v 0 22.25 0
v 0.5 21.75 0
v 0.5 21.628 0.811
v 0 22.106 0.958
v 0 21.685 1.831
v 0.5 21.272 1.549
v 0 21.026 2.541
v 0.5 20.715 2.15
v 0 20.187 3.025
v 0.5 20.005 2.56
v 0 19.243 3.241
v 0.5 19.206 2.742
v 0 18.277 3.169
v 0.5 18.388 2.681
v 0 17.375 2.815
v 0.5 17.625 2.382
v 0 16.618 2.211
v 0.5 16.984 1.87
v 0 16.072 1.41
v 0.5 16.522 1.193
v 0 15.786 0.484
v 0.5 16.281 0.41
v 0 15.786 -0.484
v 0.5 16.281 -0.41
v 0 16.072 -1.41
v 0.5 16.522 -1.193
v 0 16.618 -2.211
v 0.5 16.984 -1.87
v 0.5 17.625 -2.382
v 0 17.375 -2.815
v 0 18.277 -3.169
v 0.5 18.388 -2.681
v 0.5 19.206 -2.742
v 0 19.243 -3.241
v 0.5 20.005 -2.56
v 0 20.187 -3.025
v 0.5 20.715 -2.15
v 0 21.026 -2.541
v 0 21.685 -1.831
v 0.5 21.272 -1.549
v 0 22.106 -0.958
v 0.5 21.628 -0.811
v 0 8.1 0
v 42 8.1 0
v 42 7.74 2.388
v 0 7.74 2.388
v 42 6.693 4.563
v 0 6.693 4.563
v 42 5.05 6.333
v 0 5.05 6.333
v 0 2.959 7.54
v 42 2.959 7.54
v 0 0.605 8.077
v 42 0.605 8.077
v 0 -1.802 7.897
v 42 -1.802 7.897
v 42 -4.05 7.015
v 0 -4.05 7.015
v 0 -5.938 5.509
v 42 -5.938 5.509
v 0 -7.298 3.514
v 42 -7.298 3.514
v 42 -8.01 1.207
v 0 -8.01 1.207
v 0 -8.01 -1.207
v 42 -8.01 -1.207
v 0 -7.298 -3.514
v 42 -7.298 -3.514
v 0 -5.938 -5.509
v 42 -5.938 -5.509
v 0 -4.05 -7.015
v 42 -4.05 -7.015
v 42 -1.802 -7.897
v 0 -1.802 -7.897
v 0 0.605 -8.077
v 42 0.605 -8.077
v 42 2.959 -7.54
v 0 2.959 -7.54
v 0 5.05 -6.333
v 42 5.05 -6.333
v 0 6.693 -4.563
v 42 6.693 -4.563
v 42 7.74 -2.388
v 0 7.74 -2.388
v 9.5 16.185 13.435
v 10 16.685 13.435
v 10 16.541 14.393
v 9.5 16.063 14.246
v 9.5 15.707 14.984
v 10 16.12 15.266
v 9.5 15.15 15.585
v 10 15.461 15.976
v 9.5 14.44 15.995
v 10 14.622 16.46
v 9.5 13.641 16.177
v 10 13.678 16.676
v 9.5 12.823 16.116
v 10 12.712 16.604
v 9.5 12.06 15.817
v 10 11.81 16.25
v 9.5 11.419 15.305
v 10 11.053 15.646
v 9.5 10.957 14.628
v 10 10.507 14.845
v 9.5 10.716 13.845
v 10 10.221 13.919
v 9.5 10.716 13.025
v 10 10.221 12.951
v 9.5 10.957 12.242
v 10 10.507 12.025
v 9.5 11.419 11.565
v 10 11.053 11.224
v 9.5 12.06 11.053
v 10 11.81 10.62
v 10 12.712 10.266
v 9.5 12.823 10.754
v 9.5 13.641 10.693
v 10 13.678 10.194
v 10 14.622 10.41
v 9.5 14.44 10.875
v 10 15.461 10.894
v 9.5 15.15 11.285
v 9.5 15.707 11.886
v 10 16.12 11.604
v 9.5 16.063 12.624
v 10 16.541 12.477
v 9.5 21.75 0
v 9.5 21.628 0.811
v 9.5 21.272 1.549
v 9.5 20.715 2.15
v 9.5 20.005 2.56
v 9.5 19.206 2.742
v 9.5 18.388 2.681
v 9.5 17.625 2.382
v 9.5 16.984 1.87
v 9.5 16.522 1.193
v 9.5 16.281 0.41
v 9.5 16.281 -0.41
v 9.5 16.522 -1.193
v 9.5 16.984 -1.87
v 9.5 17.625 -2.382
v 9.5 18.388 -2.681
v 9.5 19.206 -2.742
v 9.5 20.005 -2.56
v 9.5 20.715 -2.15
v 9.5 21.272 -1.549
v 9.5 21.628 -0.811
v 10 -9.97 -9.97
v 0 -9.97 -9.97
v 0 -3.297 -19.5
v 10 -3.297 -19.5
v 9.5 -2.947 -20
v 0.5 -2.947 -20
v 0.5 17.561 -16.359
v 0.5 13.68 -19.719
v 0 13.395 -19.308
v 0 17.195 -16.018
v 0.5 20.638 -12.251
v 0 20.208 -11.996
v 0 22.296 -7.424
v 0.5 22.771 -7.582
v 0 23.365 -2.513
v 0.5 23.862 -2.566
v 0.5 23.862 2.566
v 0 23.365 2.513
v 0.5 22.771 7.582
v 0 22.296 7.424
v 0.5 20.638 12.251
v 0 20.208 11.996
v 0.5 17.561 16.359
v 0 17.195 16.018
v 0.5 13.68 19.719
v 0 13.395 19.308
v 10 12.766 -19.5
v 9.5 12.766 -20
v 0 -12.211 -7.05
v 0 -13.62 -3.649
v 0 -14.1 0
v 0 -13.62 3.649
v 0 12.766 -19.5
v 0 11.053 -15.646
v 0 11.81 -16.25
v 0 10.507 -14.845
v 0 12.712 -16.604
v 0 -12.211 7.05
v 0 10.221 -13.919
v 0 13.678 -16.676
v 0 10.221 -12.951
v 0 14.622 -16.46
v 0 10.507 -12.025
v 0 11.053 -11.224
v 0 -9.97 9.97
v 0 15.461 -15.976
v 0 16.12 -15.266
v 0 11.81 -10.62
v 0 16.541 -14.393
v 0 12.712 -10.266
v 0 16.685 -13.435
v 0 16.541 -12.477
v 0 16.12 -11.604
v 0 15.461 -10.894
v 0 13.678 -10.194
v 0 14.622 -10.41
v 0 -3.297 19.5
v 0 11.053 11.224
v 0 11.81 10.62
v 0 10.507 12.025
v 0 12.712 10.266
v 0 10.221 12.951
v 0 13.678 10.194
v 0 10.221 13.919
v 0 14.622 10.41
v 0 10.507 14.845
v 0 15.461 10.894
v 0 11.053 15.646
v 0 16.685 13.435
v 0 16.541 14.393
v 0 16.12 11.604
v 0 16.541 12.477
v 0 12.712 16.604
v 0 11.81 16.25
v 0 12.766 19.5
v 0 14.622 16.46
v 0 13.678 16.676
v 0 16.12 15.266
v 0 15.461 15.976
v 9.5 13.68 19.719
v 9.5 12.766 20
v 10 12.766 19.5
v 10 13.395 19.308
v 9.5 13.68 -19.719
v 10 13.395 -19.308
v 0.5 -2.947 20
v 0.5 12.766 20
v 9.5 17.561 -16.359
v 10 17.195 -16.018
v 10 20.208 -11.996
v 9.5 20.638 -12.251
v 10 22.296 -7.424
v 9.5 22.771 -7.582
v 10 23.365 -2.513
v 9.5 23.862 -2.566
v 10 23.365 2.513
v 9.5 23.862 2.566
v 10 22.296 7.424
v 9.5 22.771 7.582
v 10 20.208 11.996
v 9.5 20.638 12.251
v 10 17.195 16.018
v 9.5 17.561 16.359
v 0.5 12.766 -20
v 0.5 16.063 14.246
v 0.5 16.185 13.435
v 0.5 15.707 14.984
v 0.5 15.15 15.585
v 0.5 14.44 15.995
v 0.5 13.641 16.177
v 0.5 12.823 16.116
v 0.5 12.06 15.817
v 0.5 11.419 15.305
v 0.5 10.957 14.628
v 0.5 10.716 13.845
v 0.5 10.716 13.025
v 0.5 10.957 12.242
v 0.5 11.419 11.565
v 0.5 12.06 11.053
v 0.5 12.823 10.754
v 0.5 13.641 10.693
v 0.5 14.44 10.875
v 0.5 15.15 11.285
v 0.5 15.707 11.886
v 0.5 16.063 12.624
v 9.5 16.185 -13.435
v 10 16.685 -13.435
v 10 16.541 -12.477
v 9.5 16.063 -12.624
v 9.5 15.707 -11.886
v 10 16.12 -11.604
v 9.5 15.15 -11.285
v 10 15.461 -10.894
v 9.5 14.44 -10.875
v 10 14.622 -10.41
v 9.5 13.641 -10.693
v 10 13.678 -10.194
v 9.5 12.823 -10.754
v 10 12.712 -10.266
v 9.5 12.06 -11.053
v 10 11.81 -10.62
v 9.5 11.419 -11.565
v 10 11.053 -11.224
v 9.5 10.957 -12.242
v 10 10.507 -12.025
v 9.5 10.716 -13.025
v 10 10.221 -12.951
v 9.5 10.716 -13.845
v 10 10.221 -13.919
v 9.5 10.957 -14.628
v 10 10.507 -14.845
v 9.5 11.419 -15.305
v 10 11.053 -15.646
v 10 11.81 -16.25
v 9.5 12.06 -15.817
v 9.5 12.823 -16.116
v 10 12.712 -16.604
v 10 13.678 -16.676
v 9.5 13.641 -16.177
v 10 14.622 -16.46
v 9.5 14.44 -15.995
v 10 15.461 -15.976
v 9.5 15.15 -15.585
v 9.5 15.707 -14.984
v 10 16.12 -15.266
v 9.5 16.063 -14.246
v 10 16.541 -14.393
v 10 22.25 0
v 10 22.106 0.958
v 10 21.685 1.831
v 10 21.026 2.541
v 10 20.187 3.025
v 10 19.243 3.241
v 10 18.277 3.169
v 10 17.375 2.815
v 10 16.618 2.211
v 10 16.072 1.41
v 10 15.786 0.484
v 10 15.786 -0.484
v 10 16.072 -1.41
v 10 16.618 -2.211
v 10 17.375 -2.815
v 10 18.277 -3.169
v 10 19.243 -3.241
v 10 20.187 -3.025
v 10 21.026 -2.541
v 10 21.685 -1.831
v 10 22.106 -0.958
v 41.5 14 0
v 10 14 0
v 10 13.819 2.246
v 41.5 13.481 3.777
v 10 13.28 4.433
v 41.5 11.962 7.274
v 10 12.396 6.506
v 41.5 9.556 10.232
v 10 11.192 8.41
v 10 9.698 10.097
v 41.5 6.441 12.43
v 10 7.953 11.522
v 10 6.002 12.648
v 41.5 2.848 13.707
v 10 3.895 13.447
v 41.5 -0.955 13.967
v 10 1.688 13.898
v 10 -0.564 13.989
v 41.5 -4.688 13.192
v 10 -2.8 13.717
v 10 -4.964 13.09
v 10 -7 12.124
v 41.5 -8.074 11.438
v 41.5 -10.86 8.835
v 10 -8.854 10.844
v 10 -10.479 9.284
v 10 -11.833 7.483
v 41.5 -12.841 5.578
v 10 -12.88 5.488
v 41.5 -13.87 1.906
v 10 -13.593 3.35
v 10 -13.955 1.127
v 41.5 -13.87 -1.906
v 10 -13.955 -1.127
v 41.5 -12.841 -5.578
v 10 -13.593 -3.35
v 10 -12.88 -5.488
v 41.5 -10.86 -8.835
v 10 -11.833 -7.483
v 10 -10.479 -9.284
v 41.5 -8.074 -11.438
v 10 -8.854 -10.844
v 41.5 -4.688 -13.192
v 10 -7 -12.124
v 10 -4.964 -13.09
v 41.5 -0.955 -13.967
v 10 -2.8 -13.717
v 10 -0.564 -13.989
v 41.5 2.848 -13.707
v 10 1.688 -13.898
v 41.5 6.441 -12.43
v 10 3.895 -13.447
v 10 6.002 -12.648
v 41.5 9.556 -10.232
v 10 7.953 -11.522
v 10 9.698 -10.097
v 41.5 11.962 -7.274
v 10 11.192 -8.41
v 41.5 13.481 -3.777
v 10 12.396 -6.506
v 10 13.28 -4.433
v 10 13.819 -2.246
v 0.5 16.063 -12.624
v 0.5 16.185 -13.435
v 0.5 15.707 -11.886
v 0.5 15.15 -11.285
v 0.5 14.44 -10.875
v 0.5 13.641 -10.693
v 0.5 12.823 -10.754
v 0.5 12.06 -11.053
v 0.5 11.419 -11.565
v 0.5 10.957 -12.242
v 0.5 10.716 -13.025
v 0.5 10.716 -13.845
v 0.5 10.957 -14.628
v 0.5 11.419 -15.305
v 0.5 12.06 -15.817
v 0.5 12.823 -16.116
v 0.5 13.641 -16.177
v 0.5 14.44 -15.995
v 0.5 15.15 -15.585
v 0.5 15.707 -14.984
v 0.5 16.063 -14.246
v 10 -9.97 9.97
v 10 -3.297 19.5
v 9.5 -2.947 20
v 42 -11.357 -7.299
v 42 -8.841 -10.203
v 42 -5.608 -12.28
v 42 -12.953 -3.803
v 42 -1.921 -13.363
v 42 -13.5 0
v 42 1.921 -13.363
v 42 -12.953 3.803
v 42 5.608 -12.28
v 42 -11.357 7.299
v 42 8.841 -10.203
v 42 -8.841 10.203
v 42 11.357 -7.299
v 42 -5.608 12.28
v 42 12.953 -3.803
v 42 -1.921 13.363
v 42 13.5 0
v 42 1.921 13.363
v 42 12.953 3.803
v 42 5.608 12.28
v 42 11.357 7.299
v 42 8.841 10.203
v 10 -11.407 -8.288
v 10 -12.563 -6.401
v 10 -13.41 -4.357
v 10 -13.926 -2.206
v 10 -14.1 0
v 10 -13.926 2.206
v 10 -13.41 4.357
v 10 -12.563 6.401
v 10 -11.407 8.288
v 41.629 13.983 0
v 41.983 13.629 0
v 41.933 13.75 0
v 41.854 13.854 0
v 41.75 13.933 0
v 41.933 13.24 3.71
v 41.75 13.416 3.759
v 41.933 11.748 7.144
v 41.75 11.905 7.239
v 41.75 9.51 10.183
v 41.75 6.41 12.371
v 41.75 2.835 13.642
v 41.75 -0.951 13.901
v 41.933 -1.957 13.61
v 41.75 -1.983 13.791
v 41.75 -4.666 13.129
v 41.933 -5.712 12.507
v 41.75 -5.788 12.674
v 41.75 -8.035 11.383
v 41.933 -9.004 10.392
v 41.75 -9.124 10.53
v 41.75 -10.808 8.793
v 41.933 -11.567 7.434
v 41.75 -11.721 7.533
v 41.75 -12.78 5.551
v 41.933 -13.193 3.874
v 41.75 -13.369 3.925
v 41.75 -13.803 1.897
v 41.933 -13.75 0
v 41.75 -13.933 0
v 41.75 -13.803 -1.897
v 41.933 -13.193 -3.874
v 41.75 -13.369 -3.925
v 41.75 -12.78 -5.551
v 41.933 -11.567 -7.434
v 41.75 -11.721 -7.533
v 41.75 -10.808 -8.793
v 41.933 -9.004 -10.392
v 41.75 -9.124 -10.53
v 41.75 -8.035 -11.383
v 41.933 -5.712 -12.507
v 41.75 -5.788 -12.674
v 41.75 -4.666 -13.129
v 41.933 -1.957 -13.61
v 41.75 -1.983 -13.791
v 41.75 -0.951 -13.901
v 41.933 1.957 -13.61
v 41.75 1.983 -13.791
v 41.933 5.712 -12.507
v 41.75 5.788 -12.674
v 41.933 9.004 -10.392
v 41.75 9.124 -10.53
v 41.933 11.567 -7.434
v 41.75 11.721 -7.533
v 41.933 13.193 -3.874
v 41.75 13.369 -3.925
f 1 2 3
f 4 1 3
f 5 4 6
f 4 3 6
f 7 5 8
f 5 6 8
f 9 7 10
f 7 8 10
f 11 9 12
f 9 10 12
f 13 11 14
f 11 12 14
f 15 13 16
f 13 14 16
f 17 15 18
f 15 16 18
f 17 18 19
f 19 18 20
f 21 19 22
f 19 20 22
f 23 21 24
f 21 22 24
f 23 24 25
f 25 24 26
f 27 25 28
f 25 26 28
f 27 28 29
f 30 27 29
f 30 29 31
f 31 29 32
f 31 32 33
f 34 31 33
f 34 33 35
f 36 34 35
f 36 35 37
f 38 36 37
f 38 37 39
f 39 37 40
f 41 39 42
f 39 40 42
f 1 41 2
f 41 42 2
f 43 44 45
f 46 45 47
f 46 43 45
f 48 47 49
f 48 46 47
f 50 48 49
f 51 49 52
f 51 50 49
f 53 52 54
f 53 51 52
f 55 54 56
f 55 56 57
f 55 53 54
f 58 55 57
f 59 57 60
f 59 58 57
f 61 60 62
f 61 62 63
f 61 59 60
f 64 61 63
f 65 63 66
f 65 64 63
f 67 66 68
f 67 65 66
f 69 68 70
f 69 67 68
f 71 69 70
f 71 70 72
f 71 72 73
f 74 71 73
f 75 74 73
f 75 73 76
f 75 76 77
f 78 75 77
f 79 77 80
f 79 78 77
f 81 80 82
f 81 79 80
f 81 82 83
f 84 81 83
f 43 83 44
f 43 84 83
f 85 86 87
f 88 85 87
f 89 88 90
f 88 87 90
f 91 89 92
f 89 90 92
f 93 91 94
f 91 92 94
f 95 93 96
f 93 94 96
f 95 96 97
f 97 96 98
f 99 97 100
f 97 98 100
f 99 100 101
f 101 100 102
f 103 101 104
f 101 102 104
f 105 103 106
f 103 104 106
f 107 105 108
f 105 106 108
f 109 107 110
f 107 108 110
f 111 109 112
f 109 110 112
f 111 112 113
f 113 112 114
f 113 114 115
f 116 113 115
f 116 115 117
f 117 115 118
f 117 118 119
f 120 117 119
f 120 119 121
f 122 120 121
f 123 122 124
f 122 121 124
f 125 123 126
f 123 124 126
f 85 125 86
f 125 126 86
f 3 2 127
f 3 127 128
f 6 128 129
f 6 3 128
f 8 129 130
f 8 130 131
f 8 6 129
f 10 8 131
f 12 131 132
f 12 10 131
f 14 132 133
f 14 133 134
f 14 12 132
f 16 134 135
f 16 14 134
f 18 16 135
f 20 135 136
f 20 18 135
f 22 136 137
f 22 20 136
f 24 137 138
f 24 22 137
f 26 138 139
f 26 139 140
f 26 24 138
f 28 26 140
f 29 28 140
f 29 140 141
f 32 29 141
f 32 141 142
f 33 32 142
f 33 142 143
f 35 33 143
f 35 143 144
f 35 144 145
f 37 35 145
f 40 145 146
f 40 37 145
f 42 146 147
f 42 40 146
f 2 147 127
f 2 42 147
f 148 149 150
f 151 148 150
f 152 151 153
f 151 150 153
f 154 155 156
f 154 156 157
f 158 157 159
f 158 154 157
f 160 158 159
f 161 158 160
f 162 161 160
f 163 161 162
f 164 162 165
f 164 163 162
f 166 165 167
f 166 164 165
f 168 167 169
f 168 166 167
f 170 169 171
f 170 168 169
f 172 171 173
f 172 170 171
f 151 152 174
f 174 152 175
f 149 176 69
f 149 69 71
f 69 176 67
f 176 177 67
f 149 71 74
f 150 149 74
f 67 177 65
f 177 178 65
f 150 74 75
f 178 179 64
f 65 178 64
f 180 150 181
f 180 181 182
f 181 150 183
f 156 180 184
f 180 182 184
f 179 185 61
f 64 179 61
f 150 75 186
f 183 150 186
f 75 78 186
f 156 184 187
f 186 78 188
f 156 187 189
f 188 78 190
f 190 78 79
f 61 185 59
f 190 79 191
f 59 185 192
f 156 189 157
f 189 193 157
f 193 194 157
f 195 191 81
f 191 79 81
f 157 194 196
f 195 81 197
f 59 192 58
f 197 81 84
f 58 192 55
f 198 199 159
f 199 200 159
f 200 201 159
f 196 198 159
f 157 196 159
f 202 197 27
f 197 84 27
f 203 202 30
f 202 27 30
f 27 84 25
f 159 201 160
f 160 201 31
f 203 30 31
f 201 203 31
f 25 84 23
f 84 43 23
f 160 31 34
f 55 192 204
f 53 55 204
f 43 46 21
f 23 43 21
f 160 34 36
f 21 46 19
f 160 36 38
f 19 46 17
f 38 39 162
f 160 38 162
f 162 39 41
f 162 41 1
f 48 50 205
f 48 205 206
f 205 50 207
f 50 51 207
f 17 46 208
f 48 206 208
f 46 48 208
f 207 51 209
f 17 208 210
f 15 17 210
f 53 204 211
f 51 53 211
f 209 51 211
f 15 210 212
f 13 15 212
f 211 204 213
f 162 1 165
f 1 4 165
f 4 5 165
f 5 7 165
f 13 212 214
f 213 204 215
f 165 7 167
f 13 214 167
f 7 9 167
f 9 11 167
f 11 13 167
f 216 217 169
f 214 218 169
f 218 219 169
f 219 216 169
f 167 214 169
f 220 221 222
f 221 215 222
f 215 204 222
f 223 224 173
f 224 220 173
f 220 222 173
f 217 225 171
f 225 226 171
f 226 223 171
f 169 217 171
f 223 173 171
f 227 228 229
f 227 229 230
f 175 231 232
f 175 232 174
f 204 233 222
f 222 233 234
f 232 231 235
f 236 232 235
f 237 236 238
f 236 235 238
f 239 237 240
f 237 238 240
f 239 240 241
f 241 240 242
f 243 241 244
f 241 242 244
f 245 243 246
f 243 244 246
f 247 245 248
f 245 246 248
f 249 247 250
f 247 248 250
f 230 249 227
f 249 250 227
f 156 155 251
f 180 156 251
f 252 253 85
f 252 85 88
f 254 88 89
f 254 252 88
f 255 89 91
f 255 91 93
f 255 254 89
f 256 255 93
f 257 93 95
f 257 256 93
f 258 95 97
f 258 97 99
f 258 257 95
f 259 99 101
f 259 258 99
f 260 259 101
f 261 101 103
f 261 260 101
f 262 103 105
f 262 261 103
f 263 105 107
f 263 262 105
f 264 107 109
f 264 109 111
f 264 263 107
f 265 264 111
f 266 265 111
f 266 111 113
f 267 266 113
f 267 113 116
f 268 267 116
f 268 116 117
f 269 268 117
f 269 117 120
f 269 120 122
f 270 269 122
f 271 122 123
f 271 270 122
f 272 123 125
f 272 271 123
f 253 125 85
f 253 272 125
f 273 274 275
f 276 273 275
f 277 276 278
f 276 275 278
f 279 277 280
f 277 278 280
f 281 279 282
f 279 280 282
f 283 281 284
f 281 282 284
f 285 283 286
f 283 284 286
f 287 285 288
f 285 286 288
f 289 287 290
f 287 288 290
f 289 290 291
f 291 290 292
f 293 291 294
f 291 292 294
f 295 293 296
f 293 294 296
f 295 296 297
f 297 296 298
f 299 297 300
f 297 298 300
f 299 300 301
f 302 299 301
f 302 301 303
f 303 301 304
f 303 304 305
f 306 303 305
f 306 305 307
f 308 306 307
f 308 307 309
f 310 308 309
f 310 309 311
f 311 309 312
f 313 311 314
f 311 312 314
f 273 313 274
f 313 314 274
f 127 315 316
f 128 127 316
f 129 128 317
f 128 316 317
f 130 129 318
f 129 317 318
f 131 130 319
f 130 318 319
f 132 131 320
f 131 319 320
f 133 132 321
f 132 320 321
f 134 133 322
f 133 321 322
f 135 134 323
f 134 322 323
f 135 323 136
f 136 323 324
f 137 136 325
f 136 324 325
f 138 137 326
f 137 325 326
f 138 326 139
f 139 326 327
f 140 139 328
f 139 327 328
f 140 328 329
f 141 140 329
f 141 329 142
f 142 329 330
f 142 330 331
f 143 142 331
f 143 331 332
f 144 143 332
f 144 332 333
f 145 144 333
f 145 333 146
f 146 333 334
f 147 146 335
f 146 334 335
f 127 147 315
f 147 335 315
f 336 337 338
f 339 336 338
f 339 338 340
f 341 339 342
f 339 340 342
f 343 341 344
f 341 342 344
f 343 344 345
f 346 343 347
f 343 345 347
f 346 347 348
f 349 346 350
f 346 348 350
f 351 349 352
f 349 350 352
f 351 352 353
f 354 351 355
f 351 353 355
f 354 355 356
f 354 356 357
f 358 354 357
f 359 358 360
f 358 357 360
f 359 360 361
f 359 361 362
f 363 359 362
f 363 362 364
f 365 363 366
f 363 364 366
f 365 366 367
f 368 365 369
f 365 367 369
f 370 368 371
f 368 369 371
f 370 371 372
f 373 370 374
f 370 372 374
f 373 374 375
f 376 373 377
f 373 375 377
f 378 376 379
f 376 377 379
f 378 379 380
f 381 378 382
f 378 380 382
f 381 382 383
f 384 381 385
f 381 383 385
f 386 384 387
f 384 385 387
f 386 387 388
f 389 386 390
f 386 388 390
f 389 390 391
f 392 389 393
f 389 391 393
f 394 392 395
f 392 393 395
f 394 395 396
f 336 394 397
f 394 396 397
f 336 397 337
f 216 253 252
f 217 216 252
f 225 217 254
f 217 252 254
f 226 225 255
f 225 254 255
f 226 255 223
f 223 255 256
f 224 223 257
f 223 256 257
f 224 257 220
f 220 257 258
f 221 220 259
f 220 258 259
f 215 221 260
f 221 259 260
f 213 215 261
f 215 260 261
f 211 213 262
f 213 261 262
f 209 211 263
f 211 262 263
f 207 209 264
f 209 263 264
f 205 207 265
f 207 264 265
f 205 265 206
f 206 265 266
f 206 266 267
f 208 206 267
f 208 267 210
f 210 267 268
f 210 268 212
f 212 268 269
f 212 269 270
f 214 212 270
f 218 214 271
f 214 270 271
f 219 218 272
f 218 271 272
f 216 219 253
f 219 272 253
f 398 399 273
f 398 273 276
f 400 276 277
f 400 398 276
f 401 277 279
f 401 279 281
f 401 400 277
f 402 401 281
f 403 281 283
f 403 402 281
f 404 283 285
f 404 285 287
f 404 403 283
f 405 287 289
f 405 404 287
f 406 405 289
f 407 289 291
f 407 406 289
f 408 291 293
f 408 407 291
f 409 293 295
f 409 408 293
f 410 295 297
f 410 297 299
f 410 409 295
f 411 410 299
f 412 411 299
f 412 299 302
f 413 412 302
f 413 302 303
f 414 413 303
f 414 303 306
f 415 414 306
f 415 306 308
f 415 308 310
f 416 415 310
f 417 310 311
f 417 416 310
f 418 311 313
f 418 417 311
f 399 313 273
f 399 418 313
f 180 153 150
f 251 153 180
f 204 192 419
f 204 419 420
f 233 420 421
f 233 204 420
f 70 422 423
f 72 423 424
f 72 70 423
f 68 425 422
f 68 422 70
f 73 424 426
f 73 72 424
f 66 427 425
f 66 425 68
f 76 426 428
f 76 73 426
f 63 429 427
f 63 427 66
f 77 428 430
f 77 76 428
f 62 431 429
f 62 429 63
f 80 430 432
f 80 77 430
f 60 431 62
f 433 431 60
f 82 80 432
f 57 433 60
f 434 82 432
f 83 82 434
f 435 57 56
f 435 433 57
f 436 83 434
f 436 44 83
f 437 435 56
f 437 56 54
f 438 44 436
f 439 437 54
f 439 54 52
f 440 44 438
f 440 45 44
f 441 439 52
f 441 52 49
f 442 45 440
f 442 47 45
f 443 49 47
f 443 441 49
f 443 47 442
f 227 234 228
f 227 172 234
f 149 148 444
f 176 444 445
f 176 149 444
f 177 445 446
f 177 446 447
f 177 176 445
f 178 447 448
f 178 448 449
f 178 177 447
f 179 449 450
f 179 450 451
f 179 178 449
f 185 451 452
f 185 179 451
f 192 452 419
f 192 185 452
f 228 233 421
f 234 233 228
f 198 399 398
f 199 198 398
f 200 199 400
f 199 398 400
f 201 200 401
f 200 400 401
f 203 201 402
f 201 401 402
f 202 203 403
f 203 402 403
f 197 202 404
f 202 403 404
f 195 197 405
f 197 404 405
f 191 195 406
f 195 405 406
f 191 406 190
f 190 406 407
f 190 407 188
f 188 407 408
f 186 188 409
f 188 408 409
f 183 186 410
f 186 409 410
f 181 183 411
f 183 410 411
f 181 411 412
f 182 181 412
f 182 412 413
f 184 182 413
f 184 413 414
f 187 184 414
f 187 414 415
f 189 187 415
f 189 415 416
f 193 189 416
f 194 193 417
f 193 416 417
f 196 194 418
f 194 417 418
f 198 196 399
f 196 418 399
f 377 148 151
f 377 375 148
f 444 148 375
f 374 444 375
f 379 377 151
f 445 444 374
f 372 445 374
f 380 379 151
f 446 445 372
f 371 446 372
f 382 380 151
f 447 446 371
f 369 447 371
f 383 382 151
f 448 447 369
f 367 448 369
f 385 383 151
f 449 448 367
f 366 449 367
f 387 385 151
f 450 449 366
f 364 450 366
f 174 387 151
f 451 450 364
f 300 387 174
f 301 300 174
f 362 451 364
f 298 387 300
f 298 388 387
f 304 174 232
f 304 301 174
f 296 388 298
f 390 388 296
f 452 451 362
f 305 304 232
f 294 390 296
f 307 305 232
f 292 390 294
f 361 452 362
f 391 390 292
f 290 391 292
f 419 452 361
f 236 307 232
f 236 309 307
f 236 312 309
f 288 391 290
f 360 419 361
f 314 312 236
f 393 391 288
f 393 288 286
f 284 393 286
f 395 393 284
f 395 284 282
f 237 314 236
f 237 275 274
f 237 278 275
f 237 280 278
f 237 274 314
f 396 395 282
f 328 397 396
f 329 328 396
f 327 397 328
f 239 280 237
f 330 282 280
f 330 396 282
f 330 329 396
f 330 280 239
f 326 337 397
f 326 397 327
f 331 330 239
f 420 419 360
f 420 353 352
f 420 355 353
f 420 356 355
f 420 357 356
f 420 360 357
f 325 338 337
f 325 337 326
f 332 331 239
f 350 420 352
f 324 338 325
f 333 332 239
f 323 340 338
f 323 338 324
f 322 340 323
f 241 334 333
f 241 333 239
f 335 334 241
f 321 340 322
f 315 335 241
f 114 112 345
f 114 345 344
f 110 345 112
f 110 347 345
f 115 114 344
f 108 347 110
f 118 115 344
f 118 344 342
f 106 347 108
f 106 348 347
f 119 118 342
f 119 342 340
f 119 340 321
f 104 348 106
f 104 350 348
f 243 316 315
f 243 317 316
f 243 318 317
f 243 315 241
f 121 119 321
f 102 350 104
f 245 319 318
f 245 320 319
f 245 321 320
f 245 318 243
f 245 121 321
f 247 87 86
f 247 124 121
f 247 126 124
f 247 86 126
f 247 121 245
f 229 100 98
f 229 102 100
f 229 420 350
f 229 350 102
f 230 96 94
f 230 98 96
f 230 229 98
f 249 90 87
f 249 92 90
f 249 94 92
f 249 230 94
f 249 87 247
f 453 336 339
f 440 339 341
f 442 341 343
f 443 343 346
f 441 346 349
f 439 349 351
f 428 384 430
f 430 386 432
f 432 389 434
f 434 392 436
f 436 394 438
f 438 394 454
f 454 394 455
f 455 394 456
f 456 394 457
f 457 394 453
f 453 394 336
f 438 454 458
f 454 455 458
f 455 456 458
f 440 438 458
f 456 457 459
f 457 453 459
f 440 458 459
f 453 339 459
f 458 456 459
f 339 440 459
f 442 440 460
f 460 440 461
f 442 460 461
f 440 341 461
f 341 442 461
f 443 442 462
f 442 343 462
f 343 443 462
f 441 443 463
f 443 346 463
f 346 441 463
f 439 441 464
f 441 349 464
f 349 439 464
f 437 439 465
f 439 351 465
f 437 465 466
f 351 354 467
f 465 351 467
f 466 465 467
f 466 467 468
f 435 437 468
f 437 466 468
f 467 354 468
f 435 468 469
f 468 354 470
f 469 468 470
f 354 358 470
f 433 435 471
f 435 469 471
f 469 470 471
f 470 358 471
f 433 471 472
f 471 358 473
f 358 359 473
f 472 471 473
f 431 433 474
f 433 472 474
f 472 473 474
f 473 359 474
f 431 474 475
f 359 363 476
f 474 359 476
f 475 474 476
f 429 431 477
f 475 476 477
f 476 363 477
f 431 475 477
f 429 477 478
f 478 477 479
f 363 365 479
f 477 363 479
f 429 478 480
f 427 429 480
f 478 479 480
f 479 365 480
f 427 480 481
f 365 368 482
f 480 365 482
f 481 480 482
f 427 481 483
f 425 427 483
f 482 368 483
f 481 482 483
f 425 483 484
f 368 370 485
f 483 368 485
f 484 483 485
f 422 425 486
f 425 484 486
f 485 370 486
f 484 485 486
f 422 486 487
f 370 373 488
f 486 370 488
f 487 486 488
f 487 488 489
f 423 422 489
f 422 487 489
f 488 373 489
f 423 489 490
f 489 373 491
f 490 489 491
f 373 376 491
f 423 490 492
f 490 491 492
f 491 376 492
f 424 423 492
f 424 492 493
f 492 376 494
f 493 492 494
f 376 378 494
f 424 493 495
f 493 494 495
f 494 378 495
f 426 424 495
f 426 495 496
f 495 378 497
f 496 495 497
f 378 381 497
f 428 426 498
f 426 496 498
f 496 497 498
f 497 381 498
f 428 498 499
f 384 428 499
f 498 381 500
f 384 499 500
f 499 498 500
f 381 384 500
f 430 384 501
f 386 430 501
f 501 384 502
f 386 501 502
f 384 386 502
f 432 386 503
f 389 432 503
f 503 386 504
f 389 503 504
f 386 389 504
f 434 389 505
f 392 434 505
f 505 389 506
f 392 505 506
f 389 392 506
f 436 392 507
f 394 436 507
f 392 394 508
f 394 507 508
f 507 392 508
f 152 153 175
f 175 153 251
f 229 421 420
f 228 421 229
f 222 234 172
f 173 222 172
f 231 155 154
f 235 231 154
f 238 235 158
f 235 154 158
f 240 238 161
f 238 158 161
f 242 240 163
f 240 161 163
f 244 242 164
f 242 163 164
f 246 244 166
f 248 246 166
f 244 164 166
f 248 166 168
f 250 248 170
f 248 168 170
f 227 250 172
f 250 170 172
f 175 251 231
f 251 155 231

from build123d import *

# Parameters (mm, degrees)
SKETCH_R        = 2.75
SKETCH_R_2      = 8.1
PAD_DEPTH       = 10
SKETCH001_R     = 14
SKETCH001_R_2   = 8.1
PAD001_DEPTH    = 32
CHAMFER_SIZE    = 0.5
FILLET_R        = 0.5
CHAMFER001_SIZE = 0.5
POCKET_DEPTH    = 10


with BuildPart() as part:
    # Sketch → Pad (new body)
    with BuildSketch(Plane.YZ):
        with BuildLine():
            ThreePointArc((-13.266499, 20), (-24, 0), (-13.266499, -20))
            Line((-13.266499, -20), (13.266499, -20))
            ThreePointArc((13.266499, -20), (24, 0), (13.266499, 20))
            Line((-13.266499, 20), (13.266499, 20))
        make_face()
        with Locations((-13.435058, 13.435)):
            Circle(SKETCH_R, mode=Mode.SUBTRACT)
        with Locations((-19, 0)):
            Circle(SKETCH_R, mode=Mode.SUBTRACT)
        with Locations((-13.435058, -13.435)):
            Circle(SKETCH_R, mode=Mode.SUBTRACT)
        with Locations((13.435058, 13.435)):
            Circle(SKETCH_R, mode=Mode.SUBTRACT)
        with Locations((19, 0)):
            Circle(SKETCH_R, mode=Mode.SUBTRACT)
        with Locations((13.435058, -13.435)):
            Circle(SKETCH_R, mode=Mode.SUBTRACT)
        Circle(SKETCH_R_2, mode=Mode.SUBTRACT)
    extrude(amount=PAD_DEPTH)

    # Sketch001 → Pad001 (new body)
    with BuildSketch(Plane.YZ.offset(10)):
        Circle(SKETCH001_R)
        Circle(SKETCH001_R_2, mode=Mode.SUBTRACT)
    extrude(amount=PAD001_DEPTH)

    # Chamfer
    chamfer_edges = [part.edges().sort_by_distance(p)[0] for p in [
        (0, -16.185058, -13.435),
        (10, -16.185058, -13.435),
        (0, -21.75, 0),
        (10, -21.75, 0),
        (0, -16.185058, 13.435),
        (10, -16.185058, 13.435),
        (0, 10.685058, 13.435),
        (10, 10.685058, 13.435),
        (0, 16.25, 0),
        (10, 16.25, 0),
        (0, 10.685058, -13.435),
        (10, 10.685058, -13.435),
    ]]
    chamfer(chamfer_edges, length=CHAMFER_SIZE)

    # Fillet
    fillet_edges = [part.edges().sort_by_distance(p)[0] for p in [
        (42, -14, 0),
    ]]
    fillet(fillet_edges, radius=FILLET_R)

    # Chamfer001
    chamfer001_edges = [part.edges().sort_by_distance(p)[0] for p in [
        (5, -13.266499, 20),
        (5, -13.266499, -20),
        (0, -24, 0),
        (10, -24, 0),
        (5, 13.266499, 20),
        (0, 0, 20),
        (10, 0, 20),
        (5, 13.266499, -20),
        (0, 24, 0),
        (10, 24, 0),
        (0, 0, -20),
        (10, 0, -20),
    ]]
    chamfer(chamfer001_edges, length=CHAMFER001_SIZE)

    # Sketch002 → Pocket (cut)
    with BuildSketch(Plane(origin=(0, 0, 0), x_dir=(0, 1, 0), z_dir=(-1, 0, 0))):
        with BuildLine():
            ThreePointArc((-9.970206, 9.970206), (-14.1, 0), (-9.970206, -9.970206))
            Line((-9.970206, -9.970206), (-2.737206, -20.3))
            Line((-2.737206, -20.3), (18, -20.3))
            Line((18, -20.3), (18, -27))
            Line((18, -27), (0, -27))
            ThreePointArc((0, 27), (-27, 0), (0, -27))
            Line((0, 27), (18, 27))
            Line((18, 27), (18, 20.3))
            Line((18, 20.3), (-2.737206, 20.3))
            Line((-9.970206, 9.970206), (-2.737206, 20.3))
        make_face()
    extrude(amount=-POCKET_DEPTH, mode=Mode.SUBTRACT)


solid = part.part
